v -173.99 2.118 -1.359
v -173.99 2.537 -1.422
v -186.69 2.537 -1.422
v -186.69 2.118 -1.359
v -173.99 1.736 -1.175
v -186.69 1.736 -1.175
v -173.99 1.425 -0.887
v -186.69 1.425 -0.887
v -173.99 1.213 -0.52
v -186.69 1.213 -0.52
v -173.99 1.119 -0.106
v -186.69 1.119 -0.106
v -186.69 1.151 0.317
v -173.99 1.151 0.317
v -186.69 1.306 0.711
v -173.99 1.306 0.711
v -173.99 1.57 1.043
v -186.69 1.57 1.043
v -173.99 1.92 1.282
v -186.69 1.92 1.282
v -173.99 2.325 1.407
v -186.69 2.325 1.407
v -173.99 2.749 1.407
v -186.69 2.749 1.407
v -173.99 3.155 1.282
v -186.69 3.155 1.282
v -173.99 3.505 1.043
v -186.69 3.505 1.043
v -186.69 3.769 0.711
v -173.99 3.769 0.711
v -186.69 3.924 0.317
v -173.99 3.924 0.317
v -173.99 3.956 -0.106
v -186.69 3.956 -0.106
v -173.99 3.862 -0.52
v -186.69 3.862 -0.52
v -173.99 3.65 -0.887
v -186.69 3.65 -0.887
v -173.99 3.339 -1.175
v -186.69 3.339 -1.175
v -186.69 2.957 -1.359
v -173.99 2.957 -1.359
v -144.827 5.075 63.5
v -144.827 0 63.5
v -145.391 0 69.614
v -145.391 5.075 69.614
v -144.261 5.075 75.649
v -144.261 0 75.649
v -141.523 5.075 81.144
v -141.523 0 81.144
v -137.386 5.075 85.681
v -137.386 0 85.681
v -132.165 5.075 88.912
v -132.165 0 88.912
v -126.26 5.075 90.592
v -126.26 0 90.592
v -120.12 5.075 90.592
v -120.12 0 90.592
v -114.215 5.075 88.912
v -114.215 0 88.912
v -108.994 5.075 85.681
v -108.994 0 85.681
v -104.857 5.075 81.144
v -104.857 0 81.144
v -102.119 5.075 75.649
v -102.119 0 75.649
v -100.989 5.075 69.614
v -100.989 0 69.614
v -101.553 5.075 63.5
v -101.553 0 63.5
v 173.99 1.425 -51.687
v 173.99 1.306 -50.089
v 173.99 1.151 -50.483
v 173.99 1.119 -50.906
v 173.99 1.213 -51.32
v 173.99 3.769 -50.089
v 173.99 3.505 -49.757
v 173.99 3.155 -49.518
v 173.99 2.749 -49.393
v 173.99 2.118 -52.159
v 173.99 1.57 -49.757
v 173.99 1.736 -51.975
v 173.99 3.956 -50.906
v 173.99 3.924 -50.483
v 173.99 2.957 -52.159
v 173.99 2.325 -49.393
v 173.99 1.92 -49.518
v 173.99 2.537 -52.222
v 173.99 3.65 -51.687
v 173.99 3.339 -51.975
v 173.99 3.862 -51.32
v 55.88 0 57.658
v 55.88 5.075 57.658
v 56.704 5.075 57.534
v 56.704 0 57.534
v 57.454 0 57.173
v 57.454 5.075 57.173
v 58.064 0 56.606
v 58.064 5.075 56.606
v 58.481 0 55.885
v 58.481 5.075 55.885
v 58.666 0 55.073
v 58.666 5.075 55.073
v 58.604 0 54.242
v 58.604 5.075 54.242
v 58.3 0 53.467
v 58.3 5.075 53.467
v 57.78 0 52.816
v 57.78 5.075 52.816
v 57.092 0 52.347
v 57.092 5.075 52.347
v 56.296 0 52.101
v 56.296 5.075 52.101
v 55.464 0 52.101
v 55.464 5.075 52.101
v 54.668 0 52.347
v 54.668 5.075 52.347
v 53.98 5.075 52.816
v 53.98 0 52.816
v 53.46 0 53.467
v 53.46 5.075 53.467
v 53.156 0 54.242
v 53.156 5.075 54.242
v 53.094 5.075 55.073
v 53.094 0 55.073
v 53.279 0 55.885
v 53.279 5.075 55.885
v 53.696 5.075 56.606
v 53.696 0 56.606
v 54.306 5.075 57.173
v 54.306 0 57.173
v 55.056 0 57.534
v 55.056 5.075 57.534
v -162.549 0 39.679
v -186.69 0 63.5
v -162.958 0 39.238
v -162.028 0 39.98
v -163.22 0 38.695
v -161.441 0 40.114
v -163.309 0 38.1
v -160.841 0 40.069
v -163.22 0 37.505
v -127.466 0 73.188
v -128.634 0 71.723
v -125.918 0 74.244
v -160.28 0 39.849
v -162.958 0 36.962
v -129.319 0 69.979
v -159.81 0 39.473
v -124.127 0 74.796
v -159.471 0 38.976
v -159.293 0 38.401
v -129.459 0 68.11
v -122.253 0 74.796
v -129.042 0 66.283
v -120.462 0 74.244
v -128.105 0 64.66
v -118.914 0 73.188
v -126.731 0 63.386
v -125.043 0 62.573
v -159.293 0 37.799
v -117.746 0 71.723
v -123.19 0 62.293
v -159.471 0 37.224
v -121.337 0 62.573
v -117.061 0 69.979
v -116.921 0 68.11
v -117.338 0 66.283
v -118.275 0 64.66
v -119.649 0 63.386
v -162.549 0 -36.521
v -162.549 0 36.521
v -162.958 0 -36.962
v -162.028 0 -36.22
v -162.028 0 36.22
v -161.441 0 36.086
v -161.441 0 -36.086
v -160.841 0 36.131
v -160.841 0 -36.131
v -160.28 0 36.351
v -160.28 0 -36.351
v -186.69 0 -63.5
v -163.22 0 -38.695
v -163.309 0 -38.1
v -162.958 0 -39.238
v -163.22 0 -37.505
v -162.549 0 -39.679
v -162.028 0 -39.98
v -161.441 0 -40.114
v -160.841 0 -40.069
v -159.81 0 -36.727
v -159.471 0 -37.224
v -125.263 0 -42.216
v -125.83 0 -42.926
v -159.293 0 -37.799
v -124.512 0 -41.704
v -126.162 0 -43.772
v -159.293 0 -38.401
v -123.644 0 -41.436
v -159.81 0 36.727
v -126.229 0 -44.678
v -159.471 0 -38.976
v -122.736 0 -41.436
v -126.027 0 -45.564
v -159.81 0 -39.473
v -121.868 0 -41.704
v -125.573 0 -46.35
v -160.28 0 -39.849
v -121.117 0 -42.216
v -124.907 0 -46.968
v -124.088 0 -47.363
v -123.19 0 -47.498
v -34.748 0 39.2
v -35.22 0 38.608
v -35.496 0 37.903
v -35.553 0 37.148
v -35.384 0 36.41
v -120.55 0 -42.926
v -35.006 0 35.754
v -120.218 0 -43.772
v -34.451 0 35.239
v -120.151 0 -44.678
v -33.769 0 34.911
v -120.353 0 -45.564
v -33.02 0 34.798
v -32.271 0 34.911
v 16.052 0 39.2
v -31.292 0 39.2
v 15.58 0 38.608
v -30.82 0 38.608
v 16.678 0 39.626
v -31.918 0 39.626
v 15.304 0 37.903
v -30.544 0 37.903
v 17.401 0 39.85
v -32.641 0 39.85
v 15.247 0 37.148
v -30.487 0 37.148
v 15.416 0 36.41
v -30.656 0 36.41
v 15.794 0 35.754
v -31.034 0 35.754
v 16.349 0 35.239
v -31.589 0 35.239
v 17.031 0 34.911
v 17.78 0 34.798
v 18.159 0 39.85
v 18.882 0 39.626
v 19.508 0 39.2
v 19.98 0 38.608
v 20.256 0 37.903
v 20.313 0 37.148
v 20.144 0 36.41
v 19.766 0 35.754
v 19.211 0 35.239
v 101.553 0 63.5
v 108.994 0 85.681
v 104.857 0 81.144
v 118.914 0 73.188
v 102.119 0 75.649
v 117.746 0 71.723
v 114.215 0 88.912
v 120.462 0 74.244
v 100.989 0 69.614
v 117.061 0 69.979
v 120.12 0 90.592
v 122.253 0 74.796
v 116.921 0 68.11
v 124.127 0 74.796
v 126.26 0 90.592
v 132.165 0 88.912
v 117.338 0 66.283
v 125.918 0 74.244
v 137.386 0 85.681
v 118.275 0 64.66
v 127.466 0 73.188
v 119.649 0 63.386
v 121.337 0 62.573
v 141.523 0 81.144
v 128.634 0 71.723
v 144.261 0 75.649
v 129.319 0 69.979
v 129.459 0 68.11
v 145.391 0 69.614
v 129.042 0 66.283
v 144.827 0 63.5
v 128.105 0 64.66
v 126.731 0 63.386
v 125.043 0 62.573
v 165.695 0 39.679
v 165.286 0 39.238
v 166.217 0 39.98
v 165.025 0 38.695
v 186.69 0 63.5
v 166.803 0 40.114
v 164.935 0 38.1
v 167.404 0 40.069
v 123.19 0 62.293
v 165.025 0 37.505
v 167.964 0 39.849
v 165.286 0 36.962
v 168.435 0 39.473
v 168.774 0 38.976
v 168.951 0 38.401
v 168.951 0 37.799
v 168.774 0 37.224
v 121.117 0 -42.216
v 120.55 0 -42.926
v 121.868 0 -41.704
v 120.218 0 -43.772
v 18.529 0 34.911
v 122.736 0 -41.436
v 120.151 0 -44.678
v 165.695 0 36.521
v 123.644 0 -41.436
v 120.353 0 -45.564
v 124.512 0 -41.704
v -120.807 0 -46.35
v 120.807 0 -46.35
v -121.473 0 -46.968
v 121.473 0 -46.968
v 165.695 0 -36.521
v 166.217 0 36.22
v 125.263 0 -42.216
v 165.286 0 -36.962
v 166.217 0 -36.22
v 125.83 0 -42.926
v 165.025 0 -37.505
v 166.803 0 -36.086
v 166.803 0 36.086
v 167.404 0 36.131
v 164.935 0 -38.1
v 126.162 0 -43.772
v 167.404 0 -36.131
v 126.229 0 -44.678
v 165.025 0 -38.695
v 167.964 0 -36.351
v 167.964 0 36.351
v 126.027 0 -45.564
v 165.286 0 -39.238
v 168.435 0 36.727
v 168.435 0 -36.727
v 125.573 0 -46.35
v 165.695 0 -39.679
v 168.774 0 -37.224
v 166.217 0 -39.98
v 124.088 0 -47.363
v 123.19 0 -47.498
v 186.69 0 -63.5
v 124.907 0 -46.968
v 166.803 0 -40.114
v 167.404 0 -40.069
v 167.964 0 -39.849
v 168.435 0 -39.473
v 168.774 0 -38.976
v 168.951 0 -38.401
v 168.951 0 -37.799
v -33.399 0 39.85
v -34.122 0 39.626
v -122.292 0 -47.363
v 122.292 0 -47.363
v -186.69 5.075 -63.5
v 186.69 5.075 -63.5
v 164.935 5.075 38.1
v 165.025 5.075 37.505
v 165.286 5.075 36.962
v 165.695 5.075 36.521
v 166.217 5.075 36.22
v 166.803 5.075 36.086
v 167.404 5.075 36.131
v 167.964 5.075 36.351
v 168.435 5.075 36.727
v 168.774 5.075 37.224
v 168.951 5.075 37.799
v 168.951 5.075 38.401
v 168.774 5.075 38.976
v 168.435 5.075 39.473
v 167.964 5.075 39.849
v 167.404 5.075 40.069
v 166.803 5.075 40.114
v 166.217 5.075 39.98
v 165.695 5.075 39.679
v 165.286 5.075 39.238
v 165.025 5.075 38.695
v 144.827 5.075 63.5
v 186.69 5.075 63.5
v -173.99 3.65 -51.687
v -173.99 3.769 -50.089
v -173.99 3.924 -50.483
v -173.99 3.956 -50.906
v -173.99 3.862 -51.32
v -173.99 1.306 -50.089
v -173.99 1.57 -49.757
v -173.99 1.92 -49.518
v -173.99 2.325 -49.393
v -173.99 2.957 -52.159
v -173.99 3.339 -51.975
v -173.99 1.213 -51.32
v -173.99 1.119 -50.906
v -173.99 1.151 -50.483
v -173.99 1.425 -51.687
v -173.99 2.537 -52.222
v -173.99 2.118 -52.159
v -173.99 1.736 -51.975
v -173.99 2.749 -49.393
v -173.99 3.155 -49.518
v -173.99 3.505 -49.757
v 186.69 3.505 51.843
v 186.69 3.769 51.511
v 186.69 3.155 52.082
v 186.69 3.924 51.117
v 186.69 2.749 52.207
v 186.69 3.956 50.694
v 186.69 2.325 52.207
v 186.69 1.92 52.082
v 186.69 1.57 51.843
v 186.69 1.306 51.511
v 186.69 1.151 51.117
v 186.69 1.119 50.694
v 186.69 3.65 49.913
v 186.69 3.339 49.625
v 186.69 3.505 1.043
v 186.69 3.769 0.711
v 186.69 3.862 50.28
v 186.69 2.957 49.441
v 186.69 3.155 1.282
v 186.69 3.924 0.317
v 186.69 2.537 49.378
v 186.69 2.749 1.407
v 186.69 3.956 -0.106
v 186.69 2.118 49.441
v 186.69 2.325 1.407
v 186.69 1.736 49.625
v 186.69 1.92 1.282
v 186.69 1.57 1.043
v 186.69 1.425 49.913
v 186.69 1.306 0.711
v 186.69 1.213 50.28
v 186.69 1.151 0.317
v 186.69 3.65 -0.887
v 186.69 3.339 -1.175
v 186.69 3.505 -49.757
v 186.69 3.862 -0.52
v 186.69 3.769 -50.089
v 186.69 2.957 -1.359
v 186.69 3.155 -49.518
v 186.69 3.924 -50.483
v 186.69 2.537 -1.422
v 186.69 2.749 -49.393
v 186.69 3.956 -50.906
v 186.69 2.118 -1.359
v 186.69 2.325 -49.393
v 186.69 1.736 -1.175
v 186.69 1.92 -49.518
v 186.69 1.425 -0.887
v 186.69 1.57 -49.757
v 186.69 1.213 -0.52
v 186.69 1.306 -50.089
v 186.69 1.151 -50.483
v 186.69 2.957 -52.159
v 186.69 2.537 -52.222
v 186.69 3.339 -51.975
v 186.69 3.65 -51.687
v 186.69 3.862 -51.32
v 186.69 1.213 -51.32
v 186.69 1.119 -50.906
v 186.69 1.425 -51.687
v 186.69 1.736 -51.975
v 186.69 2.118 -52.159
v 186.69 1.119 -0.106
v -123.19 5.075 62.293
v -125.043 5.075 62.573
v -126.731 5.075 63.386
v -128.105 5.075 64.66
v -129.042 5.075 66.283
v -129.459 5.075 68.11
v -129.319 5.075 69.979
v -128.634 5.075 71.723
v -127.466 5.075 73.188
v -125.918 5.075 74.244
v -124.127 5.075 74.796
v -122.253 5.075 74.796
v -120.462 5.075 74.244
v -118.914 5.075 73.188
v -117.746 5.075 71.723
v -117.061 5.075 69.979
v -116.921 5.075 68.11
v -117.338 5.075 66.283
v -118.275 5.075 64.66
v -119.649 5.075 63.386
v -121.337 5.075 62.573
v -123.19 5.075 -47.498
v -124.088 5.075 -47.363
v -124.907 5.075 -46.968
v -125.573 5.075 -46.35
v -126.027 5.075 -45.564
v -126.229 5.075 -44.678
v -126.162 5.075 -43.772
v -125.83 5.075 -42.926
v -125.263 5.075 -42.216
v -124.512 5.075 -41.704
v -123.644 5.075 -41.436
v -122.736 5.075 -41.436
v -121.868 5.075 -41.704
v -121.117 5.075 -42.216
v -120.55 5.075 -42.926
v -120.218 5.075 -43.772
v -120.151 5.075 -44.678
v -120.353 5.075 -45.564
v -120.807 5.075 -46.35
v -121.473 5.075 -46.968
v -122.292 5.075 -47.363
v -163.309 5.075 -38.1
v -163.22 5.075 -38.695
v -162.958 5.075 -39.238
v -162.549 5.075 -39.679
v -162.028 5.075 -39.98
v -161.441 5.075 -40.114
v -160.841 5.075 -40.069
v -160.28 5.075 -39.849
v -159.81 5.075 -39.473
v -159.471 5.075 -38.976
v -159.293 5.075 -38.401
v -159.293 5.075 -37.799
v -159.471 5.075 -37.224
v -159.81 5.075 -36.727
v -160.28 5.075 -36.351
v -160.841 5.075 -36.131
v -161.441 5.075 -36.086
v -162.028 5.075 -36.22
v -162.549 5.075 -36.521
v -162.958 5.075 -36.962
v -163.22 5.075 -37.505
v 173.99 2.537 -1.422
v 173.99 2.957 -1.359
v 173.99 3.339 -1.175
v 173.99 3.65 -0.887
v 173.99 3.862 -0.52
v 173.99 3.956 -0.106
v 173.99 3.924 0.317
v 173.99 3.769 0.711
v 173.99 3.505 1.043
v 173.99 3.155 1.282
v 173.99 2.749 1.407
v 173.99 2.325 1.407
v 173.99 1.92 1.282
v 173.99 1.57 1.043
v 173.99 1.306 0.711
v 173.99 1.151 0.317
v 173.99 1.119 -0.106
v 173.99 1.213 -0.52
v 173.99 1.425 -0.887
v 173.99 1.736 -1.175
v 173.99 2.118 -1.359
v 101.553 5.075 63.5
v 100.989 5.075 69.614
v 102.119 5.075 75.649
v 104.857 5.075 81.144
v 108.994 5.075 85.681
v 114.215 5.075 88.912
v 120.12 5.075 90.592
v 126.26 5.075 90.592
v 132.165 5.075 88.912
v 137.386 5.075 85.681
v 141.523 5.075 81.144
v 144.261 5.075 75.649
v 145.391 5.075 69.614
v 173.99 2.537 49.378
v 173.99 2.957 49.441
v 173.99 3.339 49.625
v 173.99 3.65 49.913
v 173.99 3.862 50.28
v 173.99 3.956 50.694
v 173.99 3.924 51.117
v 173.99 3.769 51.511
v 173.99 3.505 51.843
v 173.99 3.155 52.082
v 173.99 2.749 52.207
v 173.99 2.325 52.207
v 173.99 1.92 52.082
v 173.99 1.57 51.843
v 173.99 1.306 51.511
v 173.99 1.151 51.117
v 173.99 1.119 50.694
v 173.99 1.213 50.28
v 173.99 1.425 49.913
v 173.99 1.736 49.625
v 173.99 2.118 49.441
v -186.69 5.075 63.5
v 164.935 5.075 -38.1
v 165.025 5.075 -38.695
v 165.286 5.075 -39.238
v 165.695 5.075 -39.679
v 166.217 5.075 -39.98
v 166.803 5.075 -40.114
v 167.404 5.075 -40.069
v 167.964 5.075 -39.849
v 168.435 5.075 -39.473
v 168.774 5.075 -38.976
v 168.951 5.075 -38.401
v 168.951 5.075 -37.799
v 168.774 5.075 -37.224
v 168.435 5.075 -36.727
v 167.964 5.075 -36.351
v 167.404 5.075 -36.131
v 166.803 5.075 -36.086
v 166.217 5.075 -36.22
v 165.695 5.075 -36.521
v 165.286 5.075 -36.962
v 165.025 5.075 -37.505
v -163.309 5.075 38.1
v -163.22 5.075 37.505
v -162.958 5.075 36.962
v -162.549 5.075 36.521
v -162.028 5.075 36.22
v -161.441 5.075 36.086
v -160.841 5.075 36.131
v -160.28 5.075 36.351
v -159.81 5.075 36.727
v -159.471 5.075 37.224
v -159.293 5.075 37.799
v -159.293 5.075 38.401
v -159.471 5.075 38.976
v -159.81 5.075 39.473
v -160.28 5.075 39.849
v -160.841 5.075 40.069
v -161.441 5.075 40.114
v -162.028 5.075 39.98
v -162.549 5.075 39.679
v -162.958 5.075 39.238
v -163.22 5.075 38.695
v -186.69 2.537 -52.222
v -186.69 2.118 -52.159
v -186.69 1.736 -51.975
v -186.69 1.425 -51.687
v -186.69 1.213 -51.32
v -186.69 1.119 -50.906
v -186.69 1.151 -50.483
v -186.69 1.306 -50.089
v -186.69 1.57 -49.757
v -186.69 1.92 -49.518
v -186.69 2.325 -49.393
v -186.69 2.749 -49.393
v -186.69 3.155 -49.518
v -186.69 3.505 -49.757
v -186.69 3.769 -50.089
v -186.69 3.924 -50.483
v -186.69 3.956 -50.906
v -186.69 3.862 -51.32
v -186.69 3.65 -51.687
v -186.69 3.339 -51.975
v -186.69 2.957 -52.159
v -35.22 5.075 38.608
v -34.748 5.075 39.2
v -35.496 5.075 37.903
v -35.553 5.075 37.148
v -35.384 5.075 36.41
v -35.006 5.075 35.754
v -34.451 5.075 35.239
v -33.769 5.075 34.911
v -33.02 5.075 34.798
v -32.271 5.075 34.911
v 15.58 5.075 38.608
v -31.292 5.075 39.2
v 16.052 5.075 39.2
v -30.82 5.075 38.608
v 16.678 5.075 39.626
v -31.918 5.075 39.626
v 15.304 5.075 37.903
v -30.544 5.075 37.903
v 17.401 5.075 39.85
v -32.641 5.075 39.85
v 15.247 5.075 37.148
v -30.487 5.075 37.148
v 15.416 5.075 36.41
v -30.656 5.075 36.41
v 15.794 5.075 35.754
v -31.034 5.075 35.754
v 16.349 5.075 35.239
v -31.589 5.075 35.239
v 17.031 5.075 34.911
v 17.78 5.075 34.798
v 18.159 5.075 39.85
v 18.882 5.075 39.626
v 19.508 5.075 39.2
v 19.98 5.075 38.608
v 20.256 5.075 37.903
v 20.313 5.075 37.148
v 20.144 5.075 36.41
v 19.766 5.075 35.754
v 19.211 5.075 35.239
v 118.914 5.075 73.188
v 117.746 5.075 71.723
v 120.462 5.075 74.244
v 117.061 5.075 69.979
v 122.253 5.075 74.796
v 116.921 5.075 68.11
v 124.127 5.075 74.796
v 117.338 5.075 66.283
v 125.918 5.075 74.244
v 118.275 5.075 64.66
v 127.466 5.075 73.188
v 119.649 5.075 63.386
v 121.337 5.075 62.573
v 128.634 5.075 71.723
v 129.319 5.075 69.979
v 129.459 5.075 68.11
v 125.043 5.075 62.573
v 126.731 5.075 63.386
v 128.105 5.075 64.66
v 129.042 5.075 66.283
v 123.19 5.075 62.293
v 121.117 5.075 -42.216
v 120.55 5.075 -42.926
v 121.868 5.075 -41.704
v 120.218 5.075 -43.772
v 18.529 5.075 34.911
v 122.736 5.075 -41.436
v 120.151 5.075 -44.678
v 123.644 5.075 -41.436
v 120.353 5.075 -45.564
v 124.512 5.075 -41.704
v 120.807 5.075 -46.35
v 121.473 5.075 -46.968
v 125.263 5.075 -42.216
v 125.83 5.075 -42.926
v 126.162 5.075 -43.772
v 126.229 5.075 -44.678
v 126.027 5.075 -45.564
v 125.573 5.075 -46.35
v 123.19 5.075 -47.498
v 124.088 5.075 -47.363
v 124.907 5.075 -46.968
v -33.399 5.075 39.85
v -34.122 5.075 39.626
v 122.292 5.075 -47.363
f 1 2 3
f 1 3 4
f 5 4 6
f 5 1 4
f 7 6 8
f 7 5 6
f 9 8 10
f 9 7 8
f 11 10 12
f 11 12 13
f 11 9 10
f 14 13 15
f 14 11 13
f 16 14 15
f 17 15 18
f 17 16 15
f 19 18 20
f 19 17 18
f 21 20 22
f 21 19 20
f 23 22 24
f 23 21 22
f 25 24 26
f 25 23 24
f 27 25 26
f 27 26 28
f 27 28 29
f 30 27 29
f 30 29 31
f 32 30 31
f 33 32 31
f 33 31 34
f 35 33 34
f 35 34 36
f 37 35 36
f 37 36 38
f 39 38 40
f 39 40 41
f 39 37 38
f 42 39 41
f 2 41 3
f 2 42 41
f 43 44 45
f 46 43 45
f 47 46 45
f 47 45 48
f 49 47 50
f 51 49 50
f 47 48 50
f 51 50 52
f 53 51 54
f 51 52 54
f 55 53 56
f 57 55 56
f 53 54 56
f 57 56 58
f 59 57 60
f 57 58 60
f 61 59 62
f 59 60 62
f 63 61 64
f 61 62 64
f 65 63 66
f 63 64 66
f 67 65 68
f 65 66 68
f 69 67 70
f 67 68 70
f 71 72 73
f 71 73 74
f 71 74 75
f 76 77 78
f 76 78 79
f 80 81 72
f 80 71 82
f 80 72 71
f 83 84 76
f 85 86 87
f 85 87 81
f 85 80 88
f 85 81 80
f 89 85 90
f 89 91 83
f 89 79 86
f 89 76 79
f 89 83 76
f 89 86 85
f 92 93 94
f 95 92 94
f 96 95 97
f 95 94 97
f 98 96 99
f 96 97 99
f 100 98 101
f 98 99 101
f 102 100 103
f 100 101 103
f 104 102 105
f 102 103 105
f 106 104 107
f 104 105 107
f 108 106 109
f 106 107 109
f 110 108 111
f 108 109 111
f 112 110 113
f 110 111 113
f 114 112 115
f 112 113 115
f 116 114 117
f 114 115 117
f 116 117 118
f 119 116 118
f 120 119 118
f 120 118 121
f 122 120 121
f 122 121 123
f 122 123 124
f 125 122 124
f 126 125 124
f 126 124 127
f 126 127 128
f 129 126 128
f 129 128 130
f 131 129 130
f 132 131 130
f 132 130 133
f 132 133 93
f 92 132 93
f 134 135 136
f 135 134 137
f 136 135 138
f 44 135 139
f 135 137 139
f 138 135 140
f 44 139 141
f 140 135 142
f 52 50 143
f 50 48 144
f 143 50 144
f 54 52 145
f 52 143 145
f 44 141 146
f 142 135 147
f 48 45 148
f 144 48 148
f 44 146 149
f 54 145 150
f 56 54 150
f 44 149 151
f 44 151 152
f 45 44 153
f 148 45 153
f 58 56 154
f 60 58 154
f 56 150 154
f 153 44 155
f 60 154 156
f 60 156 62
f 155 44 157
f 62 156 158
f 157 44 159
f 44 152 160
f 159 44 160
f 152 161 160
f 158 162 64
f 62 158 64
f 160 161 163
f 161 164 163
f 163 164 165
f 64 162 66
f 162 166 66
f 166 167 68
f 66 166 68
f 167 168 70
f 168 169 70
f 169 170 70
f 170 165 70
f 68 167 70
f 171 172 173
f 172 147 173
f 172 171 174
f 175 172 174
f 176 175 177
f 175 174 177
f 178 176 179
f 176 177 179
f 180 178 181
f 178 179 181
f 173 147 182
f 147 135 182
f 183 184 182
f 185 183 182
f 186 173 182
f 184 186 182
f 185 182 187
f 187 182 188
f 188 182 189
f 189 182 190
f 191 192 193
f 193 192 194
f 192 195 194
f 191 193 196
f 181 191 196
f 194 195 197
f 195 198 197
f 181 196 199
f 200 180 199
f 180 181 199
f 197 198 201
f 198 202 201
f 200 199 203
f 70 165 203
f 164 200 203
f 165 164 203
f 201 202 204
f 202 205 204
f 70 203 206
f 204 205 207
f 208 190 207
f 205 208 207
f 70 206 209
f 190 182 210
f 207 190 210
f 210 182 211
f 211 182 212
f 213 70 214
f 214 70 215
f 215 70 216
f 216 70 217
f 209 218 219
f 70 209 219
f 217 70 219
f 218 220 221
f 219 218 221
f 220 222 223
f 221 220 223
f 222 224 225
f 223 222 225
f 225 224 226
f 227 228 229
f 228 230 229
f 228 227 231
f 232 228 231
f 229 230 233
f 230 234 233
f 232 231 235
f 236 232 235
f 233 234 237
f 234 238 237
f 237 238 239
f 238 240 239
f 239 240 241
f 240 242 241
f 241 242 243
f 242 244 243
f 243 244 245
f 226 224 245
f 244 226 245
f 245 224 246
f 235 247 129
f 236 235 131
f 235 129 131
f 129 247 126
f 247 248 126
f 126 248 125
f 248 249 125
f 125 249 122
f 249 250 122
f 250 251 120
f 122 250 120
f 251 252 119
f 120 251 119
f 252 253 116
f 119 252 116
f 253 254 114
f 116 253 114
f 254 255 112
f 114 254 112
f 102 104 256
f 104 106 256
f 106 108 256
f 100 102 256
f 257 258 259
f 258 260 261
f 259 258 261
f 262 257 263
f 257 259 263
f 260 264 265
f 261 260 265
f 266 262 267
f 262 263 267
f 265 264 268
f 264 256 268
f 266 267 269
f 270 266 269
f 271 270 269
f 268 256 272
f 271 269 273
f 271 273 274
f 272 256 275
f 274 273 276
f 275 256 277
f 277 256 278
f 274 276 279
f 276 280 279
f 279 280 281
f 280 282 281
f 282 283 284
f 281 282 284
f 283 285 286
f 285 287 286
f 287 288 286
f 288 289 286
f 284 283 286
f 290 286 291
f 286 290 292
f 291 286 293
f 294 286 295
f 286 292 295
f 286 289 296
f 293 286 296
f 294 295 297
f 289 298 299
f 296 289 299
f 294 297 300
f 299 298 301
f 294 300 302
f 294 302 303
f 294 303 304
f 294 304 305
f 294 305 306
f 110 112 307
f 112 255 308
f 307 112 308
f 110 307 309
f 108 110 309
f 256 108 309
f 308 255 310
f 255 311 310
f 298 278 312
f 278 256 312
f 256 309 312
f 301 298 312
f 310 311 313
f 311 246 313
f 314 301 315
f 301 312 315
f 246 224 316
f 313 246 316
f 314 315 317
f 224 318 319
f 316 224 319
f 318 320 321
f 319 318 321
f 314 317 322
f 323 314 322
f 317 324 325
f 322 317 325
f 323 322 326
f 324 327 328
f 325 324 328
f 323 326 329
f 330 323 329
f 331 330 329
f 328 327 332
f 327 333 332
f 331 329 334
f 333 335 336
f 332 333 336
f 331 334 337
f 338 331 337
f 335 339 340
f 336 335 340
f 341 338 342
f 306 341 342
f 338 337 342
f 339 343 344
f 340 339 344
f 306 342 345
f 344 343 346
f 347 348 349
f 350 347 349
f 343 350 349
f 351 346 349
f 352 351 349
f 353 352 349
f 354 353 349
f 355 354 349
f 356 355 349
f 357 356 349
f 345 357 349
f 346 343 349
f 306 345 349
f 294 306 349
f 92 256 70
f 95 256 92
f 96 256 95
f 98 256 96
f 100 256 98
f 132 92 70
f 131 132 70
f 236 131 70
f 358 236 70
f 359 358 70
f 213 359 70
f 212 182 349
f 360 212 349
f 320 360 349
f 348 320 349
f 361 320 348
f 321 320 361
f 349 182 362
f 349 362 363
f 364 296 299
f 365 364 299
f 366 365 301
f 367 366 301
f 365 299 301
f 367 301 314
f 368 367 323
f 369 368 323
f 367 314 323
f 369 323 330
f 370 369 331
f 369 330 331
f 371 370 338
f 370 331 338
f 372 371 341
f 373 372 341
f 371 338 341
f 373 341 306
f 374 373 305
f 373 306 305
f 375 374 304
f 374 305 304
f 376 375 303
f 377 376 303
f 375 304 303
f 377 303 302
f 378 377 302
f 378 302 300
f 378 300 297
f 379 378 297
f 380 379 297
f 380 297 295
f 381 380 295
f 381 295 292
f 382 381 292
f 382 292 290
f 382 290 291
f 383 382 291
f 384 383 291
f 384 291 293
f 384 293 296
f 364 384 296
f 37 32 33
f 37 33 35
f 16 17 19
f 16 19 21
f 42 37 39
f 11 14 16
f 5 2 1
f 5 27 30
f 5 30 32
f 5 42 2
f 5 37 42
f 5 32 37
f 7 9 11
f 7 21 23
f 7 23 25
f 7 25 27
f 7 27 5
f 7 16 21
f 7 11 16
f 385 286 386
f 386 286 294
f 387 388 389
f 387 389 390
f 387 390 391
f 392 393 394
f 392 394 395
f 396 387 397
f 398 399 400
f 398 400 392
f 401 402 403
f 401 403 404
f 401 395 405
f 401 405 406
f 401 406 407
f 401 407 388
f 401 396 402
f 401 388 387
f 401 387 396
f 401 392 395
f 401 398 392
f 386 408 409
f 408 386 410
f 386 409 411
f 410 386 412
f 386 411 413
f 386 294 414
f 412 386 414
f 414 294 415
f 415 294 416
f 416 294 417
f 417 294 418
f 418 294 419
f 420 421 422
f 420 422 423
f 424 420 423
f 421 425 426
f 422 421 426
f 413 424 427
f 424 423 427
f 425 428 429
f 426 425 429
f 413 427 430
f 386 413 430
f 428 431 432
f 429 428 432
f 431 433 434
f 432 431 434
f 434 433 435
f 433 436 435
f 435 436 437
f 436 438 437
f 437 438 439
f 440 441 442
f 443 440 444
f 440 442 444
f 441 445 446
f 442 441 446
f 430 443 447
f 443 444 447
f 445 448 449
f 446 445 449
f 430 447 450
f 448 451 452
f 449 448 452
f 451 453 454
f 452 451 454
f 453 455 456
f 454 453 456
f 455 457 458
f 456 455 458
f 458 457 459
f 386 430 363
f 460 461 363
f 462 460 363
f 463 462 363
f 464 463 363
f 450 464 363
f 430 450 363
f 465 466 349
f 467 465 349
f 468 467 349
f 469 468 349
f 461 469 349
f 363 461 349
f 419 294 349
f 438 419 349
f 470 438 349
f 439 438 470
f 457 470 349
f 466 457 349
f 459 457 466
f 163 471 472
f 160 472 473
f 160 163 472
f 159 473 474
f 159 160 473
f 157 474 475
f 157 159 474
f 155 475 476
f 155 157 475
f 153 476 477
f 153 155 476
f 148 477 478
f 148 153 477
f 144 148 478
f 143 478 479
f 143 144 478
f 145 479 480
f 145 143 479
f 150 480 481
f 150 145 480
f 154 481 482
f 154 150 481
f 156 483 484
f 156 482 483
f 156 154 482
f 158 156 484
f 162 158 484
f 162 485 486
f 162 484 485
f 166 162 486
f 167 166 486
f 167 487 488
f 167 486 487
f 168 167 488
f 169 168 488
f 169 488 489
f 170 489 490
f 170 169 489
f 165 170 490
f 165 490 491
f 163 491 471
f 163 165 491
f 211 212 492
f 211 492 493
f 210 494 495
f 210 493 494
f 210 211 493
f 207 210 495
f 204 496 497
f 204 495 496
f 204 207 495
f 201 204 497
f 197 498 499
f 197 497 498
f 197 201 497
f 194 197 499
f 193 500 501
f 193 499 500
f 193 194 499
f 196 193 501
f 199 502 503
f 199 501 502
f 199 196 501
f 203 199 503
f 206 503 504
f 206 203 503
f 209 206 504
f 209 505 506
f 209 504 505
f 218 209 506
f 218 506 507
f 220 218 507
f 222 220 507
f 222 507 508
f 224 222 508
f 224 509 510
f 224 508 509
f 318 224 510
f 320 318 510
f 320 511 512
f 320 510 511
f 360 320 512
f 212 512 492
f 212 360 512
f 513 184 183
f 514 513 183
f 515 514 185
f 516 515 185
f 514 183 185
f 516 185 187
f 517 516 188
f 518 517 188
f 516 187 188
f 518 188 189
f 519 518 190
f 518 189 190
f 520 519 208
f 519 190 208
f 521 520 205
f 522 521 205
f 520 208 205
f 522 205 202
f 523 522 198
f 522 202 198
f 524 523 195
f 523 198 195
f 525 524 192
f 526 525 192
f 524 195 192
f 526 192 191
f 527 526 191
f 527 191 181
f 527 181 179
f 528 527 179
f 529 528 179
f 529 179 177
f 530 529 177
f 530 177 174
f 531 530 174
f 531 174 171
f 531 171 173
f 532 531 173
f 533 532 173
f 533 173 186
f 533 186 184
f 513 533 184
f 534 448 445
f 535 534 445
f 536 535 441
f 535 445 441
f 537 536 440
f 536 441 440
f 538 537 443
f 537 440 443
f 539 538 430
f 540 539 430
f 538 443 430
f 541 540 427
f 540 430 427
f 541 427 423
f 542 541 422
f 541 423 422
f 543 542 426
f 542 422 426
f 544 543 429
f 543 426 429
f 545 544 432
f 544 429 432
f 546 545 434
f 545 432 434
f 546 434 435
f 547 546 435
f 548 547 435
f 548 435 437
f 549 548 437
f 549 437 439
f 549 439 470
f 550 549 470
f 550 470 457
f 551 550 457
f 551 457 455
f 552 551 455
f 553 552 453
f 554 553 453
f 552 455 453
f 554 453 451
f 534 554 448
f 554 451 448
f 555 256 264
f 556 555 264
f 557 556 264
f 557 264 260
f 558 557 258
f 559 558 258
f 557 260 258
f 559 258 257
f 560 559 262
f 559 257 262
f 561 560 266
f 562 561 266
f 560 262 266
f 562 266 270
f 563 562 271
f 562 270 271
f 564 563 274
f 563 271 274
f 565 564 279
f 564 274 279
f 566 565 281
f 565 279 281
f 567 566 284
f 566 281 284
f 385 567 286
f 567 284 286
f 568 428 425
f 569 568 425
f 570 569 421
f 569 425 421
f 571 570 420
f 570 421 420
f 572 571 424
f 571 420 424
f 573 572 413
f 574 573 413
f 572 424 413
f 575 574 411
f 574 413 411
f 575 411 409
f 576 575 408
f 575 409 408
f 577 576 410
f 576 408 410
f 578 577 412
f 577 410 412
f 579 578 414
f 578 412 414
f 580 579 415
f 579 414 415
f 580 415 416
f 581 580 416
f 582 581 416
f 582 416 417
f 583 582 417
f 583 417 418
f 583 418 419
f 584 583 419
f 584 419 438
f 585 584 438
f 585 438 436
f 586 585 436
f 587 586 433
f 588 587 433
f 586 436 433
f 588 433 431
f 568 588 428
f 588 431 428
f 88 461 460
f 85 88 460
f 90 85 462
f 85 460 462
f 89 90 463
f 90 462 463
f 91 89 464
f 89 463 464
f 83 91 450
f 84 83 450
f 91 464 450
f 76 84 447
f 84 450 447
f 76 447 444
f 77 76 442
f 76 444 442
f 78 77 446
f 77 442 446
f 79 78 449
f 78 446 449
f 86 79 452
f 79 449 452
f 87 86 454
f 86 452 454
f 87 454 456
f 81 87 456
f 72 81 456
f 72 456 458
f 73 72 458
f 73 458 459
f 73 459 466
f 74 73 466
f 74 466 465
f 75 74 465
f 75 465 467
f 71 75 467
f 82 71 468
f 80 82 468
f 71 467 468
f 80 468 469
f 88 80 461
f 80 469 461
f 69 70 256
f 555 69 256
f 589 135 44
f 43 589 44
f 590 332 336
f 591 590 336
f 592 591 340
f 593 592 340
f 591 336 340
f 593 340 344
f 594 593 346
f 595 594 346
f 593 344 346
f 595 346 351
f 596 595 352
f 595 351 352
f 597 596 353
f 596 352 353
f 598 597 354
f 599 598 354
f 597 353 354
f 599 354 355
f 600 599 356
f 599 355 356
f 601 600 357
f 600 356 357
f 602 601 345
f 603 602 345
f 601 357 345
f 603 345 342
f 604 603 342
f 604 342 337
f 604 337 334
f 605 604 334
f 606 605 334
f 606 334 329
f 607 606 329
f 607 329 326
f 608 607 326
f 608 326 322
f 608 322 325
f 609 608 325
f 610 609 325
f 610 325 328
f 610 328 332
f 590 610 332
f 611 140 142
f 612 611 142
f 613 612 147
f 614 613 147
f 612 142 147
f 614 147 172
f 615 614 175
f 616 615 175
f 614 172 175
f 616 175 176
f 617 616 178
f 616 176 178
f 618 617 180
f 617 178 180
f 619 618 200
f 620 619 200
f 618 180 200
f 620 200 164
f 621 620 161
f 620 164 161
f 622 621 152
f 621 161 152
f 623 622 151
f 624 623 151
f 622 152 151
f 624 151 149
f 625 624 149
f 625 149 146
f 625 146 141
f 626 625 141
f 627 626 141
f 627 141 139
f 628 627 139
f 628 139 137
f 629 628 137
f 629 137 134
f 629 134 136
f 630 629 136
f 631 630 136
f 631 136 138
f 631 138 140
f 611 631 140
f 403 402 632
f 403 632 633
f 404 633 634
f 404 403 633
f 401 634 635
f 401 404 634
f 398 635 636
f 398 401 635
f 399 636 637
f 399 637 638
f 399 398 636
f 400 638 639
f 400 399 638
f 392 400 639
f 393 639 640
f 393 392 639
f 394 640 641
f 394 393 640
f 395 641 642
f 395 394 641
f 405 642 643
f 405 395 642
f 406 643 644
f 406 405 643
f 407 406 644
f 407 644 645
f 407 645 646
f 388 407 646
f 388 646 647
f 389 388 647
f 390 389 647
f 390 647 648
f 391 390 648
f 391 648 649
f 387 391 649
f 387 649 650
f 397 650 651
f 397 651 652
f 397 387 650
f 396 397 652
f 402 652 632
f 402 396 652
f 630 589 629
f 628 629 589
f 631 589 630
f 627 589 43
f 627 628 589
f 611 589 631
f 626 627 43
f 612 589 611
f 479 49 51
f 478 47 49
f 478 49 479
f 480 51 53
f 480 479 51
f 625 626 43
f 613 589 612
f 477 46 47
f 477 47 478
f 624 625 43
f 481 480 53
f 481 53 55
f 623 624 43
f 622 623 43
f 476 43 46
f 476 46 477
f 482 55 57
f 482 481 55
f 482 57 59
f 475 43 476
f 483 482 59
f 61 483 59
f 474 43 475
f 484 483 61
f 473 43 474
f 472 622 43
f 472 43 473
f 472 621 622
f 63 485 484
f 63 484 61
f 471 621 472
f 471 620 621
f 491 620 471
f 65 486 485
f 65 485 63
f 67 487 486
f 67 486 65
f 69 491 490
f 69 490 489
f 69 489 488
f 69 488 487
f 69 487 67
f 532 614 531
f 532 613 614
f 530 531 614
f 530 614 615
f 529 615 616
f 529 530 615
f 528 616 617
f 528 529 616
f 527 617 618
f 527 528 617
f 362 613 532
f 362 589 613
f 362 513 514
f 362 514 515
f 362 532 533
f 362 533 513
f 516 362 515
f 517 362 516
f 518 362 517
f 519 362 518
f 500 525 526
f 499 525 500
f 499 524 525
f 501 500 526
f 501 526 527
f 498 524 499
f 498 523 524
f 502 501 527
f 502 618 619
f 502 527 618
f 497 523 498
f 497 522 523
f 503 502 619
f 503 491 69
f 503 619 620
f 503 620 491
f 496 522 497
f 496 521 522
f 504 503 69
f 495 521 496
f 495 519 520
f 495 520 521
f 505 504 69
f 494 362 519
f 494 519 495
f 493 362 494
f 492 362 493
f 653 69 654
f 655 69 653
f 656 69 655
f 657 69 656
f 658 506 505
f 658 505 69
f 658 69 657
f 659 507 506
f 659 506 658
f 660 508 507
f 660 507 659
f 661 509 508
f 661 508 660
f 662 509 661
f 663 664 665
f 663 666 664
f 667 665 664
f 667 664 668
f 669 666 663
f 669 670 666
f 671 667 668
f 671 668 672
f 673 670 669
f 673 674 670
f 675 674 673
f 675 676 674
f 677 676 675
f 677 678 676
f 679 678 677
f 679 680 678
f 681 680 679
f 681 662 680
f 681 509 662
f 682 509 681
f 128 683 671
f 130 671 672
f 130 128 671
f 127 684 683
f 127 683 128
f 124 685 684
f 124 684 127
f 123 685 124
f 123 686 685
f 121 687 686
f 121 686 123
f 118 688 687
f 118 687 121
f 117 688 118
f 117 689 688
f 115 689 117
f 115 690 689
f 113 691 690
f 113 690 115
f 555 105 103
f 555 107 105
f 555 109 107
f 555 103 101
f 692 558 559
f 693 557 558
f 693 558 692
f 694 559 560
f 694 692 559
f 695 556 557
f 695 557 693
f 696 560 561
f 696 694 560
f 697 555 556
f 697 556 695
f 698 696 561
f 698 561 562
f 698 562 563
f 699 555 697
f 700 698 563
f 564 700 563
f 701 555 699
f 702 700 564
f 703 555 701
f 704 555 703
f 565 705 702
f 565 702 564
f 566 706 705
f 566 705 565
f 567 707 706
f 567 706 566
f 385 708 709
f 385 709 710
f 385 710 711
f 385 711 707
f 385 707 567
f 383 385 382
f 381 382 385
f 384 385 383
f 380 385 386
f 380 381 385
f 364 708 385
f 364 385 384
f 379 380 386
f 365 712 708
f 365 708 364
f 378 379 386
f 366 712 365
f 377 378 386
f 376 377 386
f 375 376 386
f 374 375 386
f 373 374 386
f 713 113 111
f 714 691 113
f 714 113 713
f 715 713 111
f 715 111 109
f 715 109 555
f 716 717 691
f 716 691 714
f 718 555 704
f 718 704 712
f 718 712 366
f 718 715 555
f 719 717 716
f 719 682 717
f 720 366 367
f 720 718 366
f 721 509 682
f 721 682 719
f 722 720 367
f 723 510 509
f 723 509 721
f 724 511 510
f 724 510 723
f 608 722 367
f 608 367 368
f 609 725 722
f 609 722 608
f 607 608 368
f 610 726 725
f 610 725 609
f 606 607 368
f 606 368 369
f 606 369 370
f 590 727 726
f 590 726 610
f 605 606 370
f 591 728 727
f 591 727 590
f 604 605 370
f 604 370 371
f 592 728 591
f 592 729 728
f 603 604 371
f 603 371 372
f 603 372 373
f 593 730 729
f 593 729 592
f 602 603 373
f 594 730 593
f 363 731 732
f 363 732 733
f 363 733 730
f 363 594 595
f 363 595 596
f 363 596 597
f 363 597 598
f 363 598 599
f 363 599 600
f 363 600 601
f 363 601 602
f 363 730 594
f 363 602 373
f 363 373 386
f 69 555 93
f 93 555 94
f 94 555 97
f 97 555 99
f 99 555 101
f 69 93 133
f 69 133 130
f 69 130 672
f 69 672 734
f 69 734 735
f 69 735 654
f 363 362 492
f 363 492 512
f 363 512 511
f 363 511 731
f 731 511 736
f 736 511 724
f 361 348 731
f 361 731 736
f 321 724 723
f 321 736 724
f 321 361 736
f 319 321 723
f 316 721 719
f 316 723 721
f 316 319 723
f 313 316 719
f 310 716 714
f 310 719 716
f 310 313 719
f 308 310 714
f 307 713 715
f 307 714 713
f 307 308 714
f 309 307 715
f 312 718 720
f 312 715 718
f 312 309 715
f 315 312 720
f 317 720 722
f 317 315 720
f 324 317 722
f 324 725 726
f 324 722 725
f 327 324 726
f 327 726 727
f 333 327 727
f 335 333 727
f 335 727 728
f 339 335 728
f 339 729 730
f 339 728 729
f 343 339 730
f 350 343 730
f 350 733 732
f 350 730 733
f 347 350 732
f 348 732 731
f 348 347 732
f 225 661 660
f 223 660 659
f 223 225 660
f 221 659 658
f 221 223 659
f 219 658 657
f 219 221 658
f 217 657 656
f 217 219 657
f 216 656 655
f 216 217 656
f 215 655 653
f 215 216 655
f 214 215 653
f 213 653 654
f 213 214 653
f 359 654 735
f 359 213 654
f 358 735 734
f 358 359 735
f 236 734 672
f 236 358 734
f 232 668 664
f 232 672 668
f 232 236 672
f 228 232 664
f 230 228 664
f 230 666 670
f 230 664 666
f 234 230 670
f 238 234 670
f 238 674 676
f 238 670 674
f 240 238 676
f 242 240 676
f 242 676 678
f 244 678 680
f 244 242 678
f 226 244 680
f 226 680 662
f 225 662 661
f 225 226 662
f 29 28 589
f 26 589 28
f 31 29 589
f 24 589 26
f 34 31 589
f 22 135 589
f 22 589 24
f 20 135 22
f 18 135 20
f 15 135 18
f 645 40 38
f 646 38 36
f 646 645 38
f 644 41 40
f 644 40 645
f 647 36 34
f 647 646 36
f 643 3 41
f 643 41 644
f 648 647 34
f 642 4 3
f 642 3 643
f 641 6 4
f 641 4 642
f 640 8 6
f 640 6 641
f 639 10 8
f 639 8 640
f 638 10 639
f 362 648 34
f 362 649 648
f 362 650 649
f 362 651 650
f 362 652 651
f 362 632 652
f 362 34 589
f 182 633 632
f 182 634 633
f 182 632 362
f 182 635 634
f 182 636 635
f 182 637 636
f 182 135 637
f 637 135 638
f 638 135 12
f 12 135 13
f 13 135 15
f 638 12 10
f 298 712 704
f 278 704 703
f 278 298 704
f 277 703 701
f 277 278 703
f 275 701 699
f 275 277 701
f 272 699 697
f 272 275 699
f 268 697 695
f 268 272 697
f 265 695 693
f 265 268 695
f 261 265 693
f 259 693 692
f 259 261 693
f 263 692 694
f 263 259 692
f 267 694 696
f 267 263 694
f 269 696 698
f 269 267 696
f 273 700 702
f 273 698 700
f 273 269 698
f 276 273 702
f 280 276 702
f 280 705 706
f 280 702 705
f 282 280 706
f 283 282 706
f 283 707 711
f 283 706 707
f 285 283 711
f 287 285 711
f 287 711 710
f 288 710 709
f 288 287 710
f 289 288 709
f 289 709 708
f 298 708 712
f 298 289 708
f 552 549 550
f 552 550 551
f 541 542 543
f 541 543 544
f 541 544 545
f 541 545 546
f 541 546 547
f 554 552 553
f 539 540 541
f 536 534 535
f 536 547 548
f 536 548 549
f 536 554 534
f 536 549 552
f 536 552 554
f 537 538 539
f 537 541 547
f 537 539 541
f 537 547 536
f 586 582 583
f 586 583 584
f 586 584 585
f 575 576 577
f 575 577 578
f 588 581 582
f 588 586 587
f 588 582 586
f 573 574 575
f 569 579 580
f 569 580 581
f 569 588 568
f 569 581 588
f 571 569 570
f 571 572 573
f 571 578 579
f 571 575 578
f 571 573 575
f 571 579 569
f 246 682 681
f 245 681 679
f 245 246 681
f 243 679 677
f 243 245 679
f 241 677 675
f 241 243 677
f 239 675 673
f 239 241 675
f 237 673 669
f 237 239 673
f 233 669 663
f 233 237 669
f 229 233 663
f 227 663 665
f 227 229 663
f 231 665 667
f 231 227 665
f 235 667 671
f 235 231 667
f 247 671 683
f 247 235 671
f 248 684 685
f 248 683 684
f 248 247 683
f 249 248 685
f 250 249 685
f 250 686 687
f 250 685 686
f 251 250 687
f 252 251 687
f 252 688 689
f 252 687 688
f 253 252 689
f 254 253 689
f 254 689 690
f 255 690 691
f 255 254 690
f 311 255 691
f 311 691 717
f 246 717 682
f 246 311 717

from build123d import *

# Parameters (mm, degrees)
BOSS_EXTRUDE1_DEPTH         = 5.07492
SKETCH1_5_R                 = 6.2865
CUT_EXTRUDE1_DEPTH          = 208.664293845
CUT_EXTRUDE2_DEPTH          = 208.664293845
CUT_EXTRUDE2_DEPTH_BACK     = 208.664293845
SKETCH1_7_R                 = 3.048
SKETCH1_8_R                 = 2.54
CUT_EXTRUDE3_DEPTH          = 208.664293845
F_21_0_159_DIAMETER_HOLE1_D = 4.0386
SKETCH5_R                   = 2.794
CUT_EXTRUDE4_DEPTH          = 5.08
SKETCH6_R                   = 1.4224
CUT_EXTRUDE5_DEPTH          = 12.7
CUT_EXTRUDE6_START          = -12.7
SKETCH7_R                   = 1.4224
CUT_EXTRUDE6_DEPTH          = 12.7


with BuildPart() as part:
    # Sketch1 → Boss-Extrude1 (new body)
    with BuildSketch(Plane(origin=(0, 0, 0), x_dir=(1, 0, 0), z_dir=(0, 1, 0))):
        with BuildLine():
            Line((-186.69, 63.5), (-186.69, -63.5))
            Line((-186.69, -63.5), (-144.826640797, -63.5))
            ThreePointArc((-144.826640797, -63.5), (-123.19, -90.805), (-101.553359203, -63.5))
            Line((-101.553359203, -63.5), (101.553359203, -63.5))
            ThreePointArc((101.553359203, -63.5), (123.19, -90.805), (144.826640797, -63.5))
            Line((144.826640797, -63.5), (186.69, -63.5))
            Line((186.69, -63.5), (186.69, 63.5))
            Line((186.69, 63.5), (-186.69, 63.5))
        make_face()
    extrude(amount=BOSS_EXTRUDE1_DEPTH)

    # Sketch1<5> → Cut-Extrude1 (cut, through all)
    with BuildSketch(Plane(origin=(0, 0, 0), x_dir=(1, 0, 0), z_dir=(0, 1, 0))):
        with Locations((-123.19, -68.58)):
            Circle(SKETCH1_5_R)
        with Locations((123.19, -68.58)):
            Circle(SKETCH1_5_R)
    extrude(amount=CUT_EXTRUDE1_DEPTH, mode=Mode.SUBTRACT)

    # Sketch1<7> → Cut-Extrude2 (cut, two sides: drawn at the far end of the back side and taken through both)
    with BuildSketch(Plane(origin=(0, 0, 0), x_dir=(1, 0, 0), z_dir=(0, 1, 0)).offset(-CUT_EXTRUDE2_DEPTH_BACK)):
        with Locations((-123.19, 44.45)):
            Circle(SKETCH1_7_R)
        with Locations((123.19, 44.45)):
            Circle(SKETCH1_7_R)
    extrude(amount=CUT_EXTRUDE2_DEPTH + CUT_EXTRUDE2_DEPTH_BACK, mode=Mode.SUBTRACT)

    # Sketch1<8> → Cut-Extrude3 (cut, through all)
    with BuildSketch(Plane(origin=(0, 0, 0), x_dir=(1, 0, 0), z_dir=(0, 1, 0))):
        with Locations((-33.02, -37.338)):
            Circle(SKETCH1_8_R)
        with Locations((17.78, -37.338)):
            Circle(SKETCH1_8_R)
    extrude(amount=CUT_EXTRUDE3_DEPTH, mode=Mode.SUBTRACT)

    # #21 (0.159) Diameter Hole1 (through all)
    with Locations(Plane(origin=(0, 5.07492, 0), x_dir=(1, 0, 0), z_dir=(0, 1, 0))):
        with Locations((-161.29, 38.1), (-161.29, -38.1), (166.954317475, -38.1), (166.954317475, 38.1)):
            Hole(F_21_0_159_DIAMETER_HOLE1_D / 2)

    # Sketch5 → Cut-Extrude4 (cut)
    with BuildSketch(Plane(origin=(0, 5.07492, 0), x_dir=(1, 0, 0), z_dir=(0, 1, 0))):
        with Locations((55.88, -54.864)):
            Circle(SKETCH5_R)
    extrude(amount=-CUT_EXTRUDE4_DEPTH, mode=Mode.SUBTRACT)

    # Sketch6 → Cut-Extrude5 (cut)
    with BuildSketch(Plane(origin=(186.69, 0, 0), x_dir=(0, 0, -1), z_dir=(1, 0, 0))):
        with Locations((0, 2.53746)):
            Circle(SKETCH6_R)
        with Locations((-50.8, 2.53746)):
            Circle(SKETCH6_R)
        with Locations((50.8, 2.53746)):
            Circle(SKETCH6_R)
    extrude(amount=-CUT_EXTRUDE5_DEPTH, mode=Mode.SUBTRACT)

    # Sketch7 → Cut-Extrude6 (cut)
    with BuildSketch(Plane.ZY.offset(186.69).offset(CUT_EXTRUDE6_START)):
        with Locations((-50.8, 2.53746)):
            Circle(SKETCH7_R)
        with Locations((0, 2.53746)):
            Circle(SKETCH7_R)
    extrude(amount=CUT_EXTRUDE6_DEPTH, mode=Mode.SUBTRACT)


solid = part.part
